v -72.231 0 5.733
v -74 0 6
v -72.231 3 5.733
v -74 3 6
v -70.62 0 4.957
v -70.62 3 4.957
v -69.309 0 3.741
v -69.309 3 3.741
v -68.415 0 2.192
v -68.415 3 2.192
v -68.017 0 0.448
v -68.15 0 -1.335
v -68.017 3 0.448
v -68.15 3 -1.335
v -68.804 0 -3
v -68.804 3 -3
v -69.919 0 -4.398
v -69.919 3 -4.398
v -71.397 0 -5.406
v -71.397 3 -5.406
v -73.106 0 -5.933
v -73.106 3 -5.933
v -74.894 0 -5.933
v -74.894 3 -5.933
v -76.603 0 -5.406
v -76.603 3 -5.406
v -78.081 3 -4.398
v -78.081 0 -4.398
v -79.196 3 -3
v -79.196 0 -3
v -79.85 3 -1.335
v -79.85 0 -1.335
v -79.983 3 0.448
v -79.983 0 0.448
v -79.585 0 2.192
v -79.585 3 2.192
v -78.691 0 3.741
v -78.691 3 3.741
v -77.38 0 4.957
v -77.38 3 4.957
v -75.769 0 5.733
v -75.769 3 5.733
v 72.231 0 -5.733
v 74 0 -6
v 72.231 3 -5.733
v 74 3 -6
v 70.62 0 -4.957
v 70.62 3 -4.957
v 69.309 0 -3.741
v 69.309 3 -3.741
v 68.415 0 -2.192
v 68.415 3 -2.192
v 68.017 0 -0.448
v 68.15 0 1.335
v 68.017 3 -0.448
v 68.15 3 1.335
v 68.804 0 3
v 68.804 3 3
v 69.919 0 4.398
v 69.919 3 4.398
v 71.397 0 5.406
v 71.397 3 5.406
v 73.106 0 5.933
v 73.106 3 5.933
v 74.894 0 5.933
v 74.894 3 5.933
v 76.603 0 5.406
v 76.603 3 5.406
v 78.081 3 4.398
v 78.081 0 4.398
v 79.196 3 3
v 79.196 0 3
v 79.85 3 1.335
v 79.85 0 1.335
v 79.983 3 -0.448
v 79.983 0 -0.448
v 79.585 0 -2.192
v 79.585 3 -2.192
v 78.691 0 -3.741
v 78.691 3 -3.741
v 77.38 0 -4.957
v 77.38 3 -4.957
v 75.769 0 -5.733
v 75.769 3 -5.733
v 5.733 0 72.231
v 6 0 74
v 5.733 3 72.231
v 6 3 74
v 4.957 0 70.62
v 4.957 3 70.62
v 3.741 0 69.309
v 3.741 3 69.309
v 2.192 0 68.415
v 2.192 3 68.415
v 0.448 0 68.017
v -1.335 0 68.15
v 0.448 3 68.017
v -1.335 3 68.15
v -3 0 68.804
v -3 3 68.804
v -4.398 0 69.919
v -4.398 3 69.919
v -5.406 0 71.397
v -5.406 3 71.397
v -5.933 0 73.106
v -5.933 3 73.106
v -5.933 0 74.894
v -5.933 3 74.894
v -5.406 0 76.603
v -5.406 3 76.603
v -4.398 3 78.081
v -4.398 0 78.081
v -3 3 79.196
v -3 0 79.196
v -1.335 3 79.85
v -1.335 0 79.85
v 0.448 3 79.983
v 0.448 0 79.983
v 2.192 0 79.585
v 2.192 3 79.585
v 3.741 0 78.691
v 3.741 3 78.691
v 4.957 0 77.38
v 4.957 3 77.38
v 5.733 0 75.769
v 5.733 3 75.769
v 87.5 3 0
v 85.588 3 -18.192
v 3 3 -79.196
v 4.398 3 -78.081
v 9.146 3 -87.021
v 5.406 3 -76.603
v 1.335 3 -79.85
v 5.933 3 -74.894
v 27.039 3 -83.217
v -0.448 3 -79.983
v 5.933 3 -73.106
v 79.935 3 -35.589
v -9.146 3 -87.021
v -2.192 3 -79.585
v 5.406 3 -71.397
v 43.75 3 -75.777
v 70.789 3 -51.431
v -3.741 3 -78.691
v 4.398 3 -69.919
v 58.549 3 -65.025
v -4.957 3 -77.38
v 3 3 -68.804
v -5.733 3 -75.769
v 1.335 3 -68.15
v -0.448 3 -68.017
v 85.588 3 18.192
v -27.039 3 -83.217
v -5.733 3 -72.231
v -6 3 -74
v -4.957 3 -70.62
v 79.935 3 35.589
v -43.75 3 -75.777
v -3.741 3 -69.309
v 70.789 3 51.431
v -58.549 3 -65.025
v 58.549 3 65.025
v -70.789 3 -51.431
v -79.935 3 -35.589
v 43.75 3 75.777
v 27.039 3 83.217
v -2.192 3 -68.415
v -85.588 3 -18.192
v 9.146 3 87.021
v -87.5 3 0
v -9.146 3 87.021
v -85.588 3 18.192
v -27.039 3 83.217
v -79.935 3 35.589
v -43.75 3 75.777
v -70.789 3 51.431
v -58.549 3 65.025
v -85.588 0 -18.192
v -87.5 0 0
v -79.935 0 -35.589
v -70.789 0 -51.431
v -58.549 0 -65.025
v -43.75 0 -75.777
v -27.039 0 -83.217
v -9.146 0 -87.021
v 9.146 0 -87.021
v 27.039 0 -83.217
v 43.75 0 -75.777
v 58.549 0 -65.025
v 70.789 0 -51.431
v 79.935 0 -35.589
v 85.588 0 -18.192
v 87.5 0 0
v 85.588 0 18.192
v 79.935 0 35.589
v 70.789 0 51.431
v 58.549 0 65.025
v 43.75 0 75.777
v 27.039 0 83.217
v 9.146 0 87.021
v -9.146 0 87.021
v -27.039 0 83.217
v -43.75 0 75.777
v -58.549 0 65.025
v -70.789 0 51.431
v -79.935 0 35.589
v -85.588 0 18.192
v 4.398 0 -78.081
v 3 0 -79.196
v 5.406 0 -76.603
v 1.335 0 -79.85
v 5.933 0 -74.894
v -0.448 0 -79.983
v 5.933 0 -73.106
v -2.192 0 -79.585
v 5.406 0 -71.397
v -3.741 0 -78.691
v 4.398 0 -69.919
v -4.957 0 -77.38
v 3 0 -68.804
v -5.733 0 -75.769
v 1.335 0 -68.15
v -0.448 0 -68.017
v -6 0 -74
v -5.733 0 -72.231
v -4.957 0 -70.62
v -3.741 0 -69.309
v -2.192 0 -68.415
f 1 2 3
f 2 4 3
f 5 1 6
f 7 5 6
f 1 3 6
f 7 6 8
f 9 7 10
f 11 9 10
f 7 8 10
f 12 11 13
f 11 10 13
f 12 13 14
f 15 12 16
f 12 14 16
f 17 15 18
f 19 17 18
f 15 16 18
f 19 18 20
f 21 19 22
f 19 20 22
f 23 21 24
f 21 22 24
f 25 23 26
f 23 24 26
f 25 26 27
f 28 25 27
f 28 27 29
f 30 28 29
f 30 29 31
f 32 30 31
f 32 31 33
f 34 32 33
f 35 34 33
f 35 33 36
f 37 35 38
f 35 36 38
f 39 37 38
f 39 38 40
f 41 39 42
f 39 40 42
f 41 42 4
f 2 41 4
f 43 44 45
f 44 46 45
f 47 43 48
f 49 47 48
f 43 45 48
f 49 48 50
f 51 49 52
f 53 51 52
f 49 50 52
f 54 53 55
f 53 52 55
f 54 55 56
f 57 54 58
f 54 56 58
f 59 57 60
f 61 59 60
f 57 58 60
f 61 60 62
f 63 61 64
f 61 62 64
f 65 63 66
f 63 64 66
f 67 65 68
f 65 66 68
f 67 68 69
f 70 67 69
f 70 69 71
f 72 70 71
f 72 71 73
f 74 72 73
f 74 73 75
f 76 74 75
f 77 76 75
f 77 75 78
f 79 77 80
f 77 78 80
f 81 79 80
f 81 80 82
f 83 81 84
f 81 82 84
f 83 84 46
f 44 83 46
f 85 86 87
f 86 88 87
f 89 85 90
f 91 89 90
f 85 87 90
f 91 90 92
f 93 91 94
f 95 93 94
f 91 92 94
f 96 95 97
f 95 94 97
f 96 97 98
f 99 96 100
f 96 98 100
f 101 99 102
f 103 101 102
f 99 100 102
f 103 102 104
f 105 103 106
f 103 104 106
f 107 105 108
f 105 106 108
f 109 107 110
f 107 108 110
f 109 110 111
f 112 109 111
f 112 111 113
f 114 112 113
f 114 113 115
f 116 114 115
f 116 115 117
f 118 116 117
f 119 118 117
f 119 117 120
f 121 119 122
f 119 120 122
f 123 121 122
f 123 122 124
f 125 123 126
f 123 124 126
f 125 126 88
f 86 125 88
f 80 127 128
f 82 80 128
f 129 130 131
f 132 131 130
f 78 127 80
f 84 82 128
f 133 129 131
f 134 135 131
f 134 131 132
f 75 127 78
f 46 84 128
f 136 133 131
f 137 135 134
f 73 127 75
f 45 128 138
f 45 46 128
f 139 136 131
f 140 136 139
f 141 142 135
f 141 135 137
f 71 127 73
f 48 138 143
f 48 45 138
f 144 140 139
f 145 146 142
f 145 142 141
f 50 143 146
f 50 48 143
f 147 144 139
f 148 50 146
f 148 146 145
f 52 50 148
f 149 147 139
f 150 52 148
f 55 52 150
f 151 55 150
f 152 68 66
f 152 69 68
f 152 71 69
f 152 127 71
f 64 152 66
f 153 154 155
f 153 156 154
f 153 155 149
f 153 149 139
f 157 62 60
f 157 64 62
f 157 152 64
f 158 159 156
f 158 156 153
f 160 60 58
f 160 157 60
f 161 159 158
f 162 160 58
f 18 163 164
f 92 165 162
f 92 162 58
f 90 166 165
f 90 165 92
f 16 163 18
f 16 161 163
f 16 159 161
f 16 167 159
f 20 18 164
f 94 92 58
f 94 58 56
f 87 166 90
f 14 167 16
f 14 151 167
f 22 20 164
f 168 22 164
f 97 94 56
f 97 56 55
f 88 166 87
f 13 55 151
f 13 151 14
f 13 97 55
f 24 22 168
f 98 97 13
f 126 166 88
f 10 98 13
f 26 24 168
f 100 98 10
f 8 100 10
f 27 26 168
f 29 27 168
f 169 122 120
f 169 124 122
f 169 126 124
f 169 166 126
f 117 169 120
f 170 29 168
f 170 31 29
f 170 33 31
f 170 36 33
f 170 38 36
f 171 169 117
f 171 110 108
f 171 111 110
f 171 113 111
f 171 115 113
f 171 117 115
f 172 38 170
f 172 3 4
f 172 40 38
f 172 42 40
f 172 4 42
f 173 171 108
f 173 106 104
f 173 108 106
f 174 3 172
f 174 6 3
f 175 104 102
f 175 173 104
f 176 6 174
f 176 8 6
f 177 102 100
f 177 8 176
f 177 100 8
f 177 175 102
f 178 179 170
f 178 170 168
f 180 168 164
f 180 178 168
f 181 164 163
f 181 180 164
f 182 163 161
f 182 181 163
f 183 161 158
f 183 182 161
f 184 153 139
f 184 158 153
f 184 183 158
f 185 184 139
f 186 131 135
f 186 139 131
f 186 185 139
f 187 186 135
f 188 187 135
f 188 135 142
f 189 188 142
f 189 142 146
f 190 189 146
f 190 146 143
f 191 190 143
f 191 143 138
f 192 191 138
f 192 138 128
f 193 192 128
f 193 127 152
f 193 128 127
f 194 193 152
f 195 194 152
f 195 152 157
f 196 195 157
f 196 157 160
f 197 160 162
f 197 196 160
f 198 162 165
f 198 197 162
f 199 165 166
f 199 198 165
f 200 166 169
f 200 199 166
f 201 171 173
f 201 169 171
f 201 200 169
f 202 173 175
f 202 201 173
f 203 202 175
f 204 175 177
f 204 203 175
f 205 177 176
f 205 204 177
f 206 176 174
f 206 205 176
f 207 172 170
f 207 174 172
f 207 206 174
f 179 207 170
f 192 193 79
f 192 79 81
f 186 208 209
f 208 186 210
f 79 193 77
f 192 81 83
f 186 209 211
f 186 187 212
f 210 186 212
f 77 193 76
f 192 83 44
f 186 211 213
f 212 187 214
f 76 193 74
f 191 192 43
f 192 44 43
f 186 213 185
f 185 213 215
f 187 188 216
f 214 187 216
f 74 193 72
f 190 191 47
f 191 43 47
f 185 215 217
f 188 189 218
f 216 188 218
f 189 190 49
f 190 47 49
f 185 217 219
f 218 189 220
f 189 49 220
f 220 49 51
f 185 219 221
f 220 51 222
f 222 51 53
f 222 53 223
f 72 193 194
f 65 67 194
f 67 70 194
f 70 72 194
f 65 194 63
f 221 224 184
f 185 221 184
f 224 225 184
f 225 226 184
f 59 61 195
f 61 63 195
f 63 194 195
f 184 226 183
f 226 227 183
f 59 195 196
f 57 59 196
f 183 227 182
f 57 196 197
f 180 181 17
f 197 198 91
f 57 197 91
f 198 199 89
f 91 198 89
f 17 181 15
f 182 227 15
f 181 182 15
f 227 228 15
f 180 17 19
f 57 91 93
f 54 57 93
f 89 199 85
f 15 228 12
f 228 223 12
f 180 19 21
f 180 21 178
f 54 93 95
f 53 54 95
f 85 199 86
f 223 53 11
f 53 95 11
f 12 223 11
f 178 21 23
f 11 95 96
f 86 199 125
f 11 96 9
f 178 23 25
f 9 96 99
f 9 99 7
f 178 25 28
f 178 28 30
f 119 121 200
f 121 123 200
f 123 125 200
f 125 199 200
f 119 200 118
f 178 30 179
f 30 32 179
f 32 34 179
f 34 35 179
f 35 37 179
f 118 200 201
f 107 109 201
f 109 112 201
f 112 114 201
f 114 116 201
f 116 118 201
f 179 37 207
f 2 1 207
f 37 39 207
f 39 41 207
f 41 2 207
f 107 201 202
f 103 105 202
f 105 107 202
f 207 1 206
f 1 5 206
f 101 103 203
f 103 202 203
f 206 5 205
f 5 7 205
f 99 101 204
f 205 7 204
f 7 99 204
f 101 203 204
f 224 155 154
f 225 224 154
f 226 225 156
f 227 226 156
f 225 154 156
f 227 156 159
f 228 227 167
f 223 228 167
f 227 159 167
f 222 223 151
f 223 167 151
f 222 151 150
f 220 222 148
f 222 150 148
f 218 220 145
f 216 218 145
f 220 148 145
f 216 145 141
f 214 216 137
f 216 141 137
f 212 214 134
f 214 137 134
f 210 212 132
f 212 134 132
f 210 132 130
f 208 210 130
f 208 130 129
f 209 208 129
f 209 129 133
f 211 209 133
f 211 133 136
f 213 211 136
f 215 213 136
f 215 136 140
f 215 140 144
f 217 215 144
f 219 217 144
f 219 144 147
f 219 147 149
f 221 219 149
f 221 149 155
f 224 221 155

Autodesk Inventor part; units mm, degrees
ref_plane "YZ Plane" through (0, 0, 0) normal (1, 0, 0) x (0, 1, 0)
ref_plane "XZ Plane" through (0, 0, 0) normal (0, 1, 0) x (-1, 0, 0)
ref_plane "XY Plane" through (0, 0, 0) normal (0, 0, 1) x (1, 0, 0)
sketch "Sketch1" plane through (0, 0, 0) normal (0, 1, 0) x (-1, 0, 0)
  circle A0 centre (0, 0) radius 87.5
  dimension "d0" = 175
extrude "Plate1" add sketch "Sketch1" along normal blind 3
sketch "Sketch2" plane through (0, 3, 0) normal (0, 1, 0) x (1, 0, 0)
  line L0 (-40, -40) -> (40, -40) construction
  line L1 (40, -40) -> (40, 40) construction
  line L2 (40, 40) -> (-40, 40) construction
  line L3 (-40, 40) -> (-40, -40) construction
  line L4 (40, -40) -> (-40, 40) construction
  circle A0 centre (0, 0) radius 87.5 projected
  line L5 (0, 0) -> (0, -87.5) construction
  circle A1 centre (0, -74) radius 6
  dimension "d2" = 80
  dimension "d3" = 80
  dimension "d16" = 12
  dimension "d17" = 13.5
extrude "Extrusion1" cut sketch "Sketch2" against normal through all contours A1
pattern_circular "Circular Pattern1" count 4 over 360 about axis through (0, -10, 0) along (0, 1, 0) of "Extrusion1"
equation "\"d1\" = Thickness"
equation "\"BendReliefWidth\" = Thickness"
equation "\"BendReliefDepth\" = 0.5 * Thickness"
equation "\"CornerReliefSize\" = 4 * Thickness"
equation "\"MinimumRemnant\" = 2 * Thickness"
equation "\"TransitionRadius\" = BendRadius"
equation "\"JacobiRadiusSize\" = BendRadius"
equation "\"GapSize\" = Thickness"
equation "\"Thickness\" = 3"
equation "\"BendRadius\" = 5"
properties part number "MSC 126 flange base tube" material "Stainless Steel"
